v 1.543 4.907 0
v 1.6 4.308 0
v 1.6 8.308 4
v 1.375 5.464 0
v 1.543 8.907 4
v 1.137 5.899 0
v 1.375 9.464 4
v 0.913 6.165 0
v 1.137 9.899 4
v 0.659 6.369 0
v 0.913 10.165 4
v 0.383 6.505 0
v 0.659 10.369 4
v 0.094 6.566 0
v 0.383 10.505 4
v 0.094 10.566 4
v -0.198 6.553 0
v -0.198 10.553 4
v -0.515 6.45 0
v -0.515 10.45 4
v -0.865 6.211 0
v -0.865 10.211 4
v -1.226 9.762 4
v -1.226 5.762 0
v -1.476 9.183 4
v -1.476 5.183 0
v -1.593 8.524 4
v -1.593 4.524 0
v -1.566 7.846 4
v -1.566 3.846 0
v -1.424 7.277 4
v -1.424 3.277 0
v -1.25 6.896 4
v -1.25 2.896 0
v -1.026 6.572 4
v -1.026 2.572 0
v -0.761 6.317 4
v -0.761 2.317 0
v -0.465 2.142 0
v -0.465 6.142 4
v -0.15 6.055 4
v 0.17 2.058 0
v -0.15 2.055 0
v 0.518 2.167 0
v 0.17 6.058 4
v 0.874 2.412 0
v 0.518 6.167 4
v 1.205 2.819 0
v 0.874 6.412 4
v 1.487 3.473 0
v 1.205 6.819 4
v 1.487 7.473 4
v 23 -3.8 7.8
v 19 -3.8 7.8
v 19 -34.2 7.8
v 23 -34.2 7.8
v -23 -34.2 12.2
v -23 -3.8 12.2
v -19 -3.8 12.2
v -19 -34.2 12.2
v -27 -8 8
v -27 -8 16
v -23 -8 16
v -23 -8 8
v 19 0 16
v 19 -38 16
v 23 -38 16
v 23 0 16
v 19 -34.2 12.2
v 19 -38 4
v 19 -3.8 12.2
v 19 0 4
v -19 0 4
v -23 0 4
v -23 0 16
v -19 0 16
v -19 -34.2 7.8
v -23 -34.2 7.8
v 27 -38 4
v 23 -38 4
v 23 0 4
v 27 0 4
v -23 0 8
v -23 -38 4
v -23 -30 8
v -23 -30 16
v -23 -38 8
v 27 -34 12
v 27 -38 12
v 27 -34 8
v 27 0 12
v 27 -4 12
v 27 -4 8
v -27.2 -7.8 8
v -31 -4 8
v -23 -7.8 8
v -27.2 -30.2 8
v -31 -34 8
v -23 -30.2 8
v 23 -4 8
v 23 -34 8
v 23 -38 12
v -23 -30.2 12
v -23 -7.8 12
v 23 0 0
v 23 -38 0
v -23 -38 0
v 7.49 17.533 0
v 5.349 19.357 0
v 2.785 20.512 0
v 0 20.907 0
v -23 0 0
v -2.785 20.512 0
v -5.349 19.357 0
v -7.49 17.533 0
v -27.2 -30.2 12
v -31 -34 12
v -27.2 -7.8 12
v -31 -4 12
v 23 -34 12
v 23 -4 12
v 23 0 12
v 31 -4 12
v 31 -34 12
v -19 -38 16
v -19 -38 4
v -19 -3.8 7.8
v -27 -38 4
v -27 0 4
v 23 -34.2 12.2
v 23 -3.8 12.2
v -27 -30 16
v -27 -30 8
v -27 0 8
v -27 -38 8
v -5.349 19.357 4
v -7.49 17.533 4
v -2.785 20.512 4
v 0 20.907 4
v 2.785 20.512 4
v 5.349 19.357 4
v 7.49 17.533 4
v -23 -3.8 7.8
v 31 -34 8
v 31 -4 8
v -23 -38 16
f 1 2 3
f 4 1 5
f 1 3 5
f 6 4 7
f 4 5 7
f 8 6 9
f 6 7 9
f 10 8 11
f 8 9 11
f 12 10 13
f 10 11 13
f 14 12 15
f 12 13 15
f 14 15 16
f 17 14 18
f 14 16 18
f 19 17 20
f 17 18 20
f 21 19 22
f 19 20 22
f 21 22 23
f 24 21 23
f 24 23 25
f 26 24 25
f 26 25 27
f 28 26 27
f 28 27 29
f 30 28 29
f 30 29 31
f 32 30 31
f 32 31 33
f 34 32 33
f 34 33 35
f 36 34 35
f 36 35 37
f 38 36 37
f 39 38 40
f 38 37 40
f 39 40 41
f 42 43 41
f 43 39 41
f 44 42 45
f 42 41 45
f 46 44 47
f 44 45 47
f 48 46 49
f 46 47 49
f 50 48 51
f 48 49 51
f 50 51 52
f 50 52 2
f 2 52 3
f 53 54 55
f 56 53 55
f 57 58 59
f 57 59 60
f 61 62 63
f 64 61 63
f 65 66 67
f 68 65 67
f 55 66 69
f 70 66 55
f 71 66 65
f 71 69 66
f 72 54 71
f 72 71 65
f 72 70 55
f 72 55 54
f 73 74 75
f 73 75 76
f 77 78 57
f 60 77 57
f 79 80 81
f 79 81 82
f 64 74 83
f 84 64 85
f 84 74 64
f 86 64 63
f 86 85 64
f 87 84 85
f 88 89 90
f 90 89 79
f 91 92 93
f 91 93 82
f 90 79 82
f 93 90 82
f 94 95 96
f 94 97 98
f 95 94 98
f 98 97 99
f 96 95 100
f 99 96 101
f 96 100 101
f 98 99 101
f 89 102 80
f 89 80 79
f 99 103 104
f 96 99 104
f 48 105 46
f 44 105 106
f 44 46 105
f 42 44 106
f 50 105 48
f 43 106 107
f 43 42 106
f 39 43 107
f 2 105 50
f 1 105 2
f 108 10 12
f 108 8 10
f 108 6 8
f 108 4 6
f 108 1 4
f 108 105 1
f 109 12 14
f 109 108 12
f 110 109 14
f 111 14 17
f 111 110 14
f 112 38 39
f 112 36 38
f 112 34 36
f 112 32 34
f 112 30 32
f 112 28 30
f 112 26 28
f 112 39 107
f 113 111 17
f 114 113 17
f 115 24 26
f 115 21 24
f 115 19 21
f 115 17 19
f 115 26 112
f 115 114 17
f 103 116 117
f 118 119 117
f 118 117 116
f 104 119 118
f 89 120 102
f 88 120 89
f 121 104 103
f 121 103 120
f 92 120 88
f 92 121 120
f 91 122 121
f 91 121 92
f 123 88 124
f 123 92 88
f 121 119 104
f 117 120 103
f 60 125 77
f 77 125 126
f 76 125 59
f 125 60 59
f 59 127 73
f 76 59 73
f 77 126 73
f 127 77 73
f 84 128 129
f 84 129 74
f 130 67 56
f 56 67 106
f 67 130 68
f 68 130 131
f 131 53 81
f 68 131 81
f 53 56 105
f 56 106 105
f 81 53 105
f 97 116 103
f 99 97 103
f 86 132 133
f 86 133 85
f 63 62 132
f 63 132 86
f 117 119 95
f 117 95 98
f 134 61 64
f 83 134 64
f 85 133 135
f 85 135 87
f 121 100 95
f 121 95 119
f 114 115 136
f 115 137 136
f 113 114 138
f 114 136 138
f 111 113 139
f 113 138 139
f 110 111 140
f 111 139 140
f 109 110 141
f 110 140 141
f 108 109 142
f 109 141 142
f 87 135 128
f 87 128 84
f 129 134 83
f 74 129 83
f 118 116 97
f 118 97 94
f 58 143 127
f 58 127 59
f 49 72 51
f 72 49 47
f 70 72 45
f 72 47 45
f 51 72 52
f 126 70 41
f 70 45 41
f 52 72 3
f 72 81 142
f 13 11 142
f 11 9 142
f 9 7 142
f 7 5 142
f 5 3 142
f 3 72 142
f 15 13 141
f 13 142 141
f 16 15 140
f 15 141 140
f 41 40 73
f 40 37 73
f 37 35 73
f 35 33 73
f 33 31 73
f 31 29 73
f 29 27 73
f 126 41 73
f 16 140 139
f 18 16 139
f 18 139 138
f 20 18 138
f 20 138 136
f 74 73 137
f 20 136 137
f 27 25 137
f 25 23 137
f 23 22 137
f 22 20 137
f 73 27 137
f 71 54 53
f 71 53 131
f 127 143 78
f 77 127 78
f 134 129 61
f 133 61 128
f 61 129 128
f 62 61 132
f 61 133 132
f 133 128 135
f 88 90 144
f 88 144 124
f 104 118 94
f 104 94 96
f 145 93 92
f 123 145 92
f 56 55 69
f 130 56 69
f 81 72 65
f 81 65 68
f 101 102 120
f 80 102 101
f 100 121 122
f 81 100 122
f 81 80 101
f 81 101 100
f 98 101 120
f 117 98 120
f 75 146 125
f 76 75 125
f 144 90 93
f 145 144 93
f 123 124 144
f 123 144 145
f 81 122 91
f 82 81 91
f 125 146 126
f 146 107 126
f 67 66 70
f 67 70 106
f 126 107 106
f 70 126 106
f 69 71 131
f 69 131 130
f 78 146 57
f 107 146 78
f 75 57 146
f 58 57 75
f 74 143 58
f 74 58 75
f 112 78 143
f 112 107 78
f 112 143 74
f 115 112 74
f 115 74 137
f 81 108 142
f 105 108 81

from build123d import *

# Parameters (mm, degrees)
PAD_DEPTH         = 4
SKETCH001_R       = 1.6
POCKET_DEPTH      = 37.7203
SKETCH002_W       = 4
SKETCH002_H       = 38
PAD001_DEPTH      = 12
SKETCH003_W       = 30.4
SKETCH003_H       = 4.4
POCKET001_DEPTH   = 46.001
FILLET_R          = 10
PAD002_START      = 4
SKETCH004_W       = 4
SKETCH004_H       = 38
PAD002_DEPTH      = 8
SKETCH005_W       = 30
SKETCH005_H       = 4
PAD003_DEPTH      = 54
SKETCH006_W       = 4.2
SKETCH006_H       = 22.4
POCKET002_DEPTH   = 4
SKETCH009_W       = 30
SKETCH009_H       = 4
PAD006_DEPTH      = 4
PAD004_START      = 8
SKETCH007_W       = 4
SKETCH007_H       = 12
PAD004_DEPTH      = 22
SKETCH008_W       = 4
SKETCH008_H       = 4
PAD005_DEPTH      = 8
PAD005_DEPTH_BACK = 30


with BuildPart() as base_body:
    # Sketch → Pad (new body)
    with BuildSketch(Plane.XY):
        Polygon((-23, -38), (-23, 0), (0, 26), (23, 0), (23, -4), (23, -34), (23, -38), (19, -38), (-19, -38), align=None)
    extrude(amount=PAD_DEPTH)

    # Sketch001 (on Face11 of Pad) → Pocket (cut, through all)
    with BuildSketch(Plane(origin=(0, 0.979185, 14.363961), x_dir=(1, 0, 0), z_dir=(0, 0.707107, 0.707107))):
        with Locations((0, 12.510408)):
            Circle(SKETCH001_R)
    extrude(amount=-POCKET_DEPTH, mode=Mode.SUBTRACT)

    # Sketch002 (on Face11 of Pad) → Pad001 (join)
    with BuildSketch(Plane.XY.offset(4)):
        with Locations((-21, -19)):
            Rectangle(SKETCH002_W, SKETCH002_H)
        with Locations((21, -19)):
            Rectangle(SKETCH002_W, SKETCH002_H)
    extrude(amount=PAD001_DEPTH)

    # Sketch003 (on Face5 of Pad001) → Pocket001 (cut, through all)
    with BuildSketch(Plane(origin=(-23, 0, 0), x_dir=(0, -1, 0), z_dir=(-1, 0, 0))):
        with Locations((19, 10)):
            Rectangle(SKETCH003_W, SKETCH003_H)
    extrude(amount=-POCKET001_DEPTH, mode=Mode.SUBTRACT)

    # Fillet
    fillet_edges = [base_body.edges().sort_by_distance(p)[0] for p in [
        (0, 26, 2),
    ]]
    fillet(fillet_edges, radius=FILLET_R)


with BuildPart() as pin:
    # Sketch004 → Pad002 (new body)
    with BuildSketch(Plane.XY.offset(PAD002_START)):
        with Locations((25, -19)):
            Rectangle(SKETCH004_W, SKETCH004_H)
    extrude(amount=PAD002_DEPTH)

    # Sketch005 (on Face2 of Pad002) → Pad003 (join)
    with BuildSketch(Plane(origin=(23, 0, 0), x_dir=(0, -1, 0), z_dir=(-1, 0, 0))):
        with Locations((19, 10)):
            Rectangle(SKETCH005_W, SKETCH005_H)
    extrude(amount=PAD003_DEPTH)

    # Sketch006 (on Face10 of Pad003) → Pocket002 (cut)
    with BuildSketch(Plane.XY.offset(12)):
        with Locations((-25.1, -19)):
            Rectangle(SKETCH006_W, SKETCH006_H)
    extrude(amount=-POCKET002_DEPTH, mode=Mode.SUBTRACT)

    # Sketch009 (on Face2 of Pocket002) → Pad006 (join)
    with BuildSketch(Plane.YZ.offset(27)):
        with Locations((-19, 10)):
            Rectangle(SKETCH009_W, SKETCH009_H)
    extrude(amount=PAD006_DEPTH)


with BuildPart() as locking_pin:
    # Sketch007 → Pad004 (new body)
    with BuildSketch(Plane.XZ.offset(PAD004_START)):
        with Locations((-25, 10)):
            Rectangle(SKETCH007_W, SKETCH007_H)
    extrude(amount=PAD004_DEPTH)

    # Sketch008 (on Face6 of Pad004) → Pad005 (join, two sides)
    with BuildSketch(Plane.XZ.offset(30)) as pad005_sk:
        with Locations((-25, 6)):
            Rectangle(SKETCH008_W, SKETCH008_H)
    extrude(amount=PAD005_DEPTH)
    extrude(pad005_sk.sketch, amount=-PAD005_DEPTH_BACK)


solid = Compound([base_body.part, pin.part, locking_pin.part])
